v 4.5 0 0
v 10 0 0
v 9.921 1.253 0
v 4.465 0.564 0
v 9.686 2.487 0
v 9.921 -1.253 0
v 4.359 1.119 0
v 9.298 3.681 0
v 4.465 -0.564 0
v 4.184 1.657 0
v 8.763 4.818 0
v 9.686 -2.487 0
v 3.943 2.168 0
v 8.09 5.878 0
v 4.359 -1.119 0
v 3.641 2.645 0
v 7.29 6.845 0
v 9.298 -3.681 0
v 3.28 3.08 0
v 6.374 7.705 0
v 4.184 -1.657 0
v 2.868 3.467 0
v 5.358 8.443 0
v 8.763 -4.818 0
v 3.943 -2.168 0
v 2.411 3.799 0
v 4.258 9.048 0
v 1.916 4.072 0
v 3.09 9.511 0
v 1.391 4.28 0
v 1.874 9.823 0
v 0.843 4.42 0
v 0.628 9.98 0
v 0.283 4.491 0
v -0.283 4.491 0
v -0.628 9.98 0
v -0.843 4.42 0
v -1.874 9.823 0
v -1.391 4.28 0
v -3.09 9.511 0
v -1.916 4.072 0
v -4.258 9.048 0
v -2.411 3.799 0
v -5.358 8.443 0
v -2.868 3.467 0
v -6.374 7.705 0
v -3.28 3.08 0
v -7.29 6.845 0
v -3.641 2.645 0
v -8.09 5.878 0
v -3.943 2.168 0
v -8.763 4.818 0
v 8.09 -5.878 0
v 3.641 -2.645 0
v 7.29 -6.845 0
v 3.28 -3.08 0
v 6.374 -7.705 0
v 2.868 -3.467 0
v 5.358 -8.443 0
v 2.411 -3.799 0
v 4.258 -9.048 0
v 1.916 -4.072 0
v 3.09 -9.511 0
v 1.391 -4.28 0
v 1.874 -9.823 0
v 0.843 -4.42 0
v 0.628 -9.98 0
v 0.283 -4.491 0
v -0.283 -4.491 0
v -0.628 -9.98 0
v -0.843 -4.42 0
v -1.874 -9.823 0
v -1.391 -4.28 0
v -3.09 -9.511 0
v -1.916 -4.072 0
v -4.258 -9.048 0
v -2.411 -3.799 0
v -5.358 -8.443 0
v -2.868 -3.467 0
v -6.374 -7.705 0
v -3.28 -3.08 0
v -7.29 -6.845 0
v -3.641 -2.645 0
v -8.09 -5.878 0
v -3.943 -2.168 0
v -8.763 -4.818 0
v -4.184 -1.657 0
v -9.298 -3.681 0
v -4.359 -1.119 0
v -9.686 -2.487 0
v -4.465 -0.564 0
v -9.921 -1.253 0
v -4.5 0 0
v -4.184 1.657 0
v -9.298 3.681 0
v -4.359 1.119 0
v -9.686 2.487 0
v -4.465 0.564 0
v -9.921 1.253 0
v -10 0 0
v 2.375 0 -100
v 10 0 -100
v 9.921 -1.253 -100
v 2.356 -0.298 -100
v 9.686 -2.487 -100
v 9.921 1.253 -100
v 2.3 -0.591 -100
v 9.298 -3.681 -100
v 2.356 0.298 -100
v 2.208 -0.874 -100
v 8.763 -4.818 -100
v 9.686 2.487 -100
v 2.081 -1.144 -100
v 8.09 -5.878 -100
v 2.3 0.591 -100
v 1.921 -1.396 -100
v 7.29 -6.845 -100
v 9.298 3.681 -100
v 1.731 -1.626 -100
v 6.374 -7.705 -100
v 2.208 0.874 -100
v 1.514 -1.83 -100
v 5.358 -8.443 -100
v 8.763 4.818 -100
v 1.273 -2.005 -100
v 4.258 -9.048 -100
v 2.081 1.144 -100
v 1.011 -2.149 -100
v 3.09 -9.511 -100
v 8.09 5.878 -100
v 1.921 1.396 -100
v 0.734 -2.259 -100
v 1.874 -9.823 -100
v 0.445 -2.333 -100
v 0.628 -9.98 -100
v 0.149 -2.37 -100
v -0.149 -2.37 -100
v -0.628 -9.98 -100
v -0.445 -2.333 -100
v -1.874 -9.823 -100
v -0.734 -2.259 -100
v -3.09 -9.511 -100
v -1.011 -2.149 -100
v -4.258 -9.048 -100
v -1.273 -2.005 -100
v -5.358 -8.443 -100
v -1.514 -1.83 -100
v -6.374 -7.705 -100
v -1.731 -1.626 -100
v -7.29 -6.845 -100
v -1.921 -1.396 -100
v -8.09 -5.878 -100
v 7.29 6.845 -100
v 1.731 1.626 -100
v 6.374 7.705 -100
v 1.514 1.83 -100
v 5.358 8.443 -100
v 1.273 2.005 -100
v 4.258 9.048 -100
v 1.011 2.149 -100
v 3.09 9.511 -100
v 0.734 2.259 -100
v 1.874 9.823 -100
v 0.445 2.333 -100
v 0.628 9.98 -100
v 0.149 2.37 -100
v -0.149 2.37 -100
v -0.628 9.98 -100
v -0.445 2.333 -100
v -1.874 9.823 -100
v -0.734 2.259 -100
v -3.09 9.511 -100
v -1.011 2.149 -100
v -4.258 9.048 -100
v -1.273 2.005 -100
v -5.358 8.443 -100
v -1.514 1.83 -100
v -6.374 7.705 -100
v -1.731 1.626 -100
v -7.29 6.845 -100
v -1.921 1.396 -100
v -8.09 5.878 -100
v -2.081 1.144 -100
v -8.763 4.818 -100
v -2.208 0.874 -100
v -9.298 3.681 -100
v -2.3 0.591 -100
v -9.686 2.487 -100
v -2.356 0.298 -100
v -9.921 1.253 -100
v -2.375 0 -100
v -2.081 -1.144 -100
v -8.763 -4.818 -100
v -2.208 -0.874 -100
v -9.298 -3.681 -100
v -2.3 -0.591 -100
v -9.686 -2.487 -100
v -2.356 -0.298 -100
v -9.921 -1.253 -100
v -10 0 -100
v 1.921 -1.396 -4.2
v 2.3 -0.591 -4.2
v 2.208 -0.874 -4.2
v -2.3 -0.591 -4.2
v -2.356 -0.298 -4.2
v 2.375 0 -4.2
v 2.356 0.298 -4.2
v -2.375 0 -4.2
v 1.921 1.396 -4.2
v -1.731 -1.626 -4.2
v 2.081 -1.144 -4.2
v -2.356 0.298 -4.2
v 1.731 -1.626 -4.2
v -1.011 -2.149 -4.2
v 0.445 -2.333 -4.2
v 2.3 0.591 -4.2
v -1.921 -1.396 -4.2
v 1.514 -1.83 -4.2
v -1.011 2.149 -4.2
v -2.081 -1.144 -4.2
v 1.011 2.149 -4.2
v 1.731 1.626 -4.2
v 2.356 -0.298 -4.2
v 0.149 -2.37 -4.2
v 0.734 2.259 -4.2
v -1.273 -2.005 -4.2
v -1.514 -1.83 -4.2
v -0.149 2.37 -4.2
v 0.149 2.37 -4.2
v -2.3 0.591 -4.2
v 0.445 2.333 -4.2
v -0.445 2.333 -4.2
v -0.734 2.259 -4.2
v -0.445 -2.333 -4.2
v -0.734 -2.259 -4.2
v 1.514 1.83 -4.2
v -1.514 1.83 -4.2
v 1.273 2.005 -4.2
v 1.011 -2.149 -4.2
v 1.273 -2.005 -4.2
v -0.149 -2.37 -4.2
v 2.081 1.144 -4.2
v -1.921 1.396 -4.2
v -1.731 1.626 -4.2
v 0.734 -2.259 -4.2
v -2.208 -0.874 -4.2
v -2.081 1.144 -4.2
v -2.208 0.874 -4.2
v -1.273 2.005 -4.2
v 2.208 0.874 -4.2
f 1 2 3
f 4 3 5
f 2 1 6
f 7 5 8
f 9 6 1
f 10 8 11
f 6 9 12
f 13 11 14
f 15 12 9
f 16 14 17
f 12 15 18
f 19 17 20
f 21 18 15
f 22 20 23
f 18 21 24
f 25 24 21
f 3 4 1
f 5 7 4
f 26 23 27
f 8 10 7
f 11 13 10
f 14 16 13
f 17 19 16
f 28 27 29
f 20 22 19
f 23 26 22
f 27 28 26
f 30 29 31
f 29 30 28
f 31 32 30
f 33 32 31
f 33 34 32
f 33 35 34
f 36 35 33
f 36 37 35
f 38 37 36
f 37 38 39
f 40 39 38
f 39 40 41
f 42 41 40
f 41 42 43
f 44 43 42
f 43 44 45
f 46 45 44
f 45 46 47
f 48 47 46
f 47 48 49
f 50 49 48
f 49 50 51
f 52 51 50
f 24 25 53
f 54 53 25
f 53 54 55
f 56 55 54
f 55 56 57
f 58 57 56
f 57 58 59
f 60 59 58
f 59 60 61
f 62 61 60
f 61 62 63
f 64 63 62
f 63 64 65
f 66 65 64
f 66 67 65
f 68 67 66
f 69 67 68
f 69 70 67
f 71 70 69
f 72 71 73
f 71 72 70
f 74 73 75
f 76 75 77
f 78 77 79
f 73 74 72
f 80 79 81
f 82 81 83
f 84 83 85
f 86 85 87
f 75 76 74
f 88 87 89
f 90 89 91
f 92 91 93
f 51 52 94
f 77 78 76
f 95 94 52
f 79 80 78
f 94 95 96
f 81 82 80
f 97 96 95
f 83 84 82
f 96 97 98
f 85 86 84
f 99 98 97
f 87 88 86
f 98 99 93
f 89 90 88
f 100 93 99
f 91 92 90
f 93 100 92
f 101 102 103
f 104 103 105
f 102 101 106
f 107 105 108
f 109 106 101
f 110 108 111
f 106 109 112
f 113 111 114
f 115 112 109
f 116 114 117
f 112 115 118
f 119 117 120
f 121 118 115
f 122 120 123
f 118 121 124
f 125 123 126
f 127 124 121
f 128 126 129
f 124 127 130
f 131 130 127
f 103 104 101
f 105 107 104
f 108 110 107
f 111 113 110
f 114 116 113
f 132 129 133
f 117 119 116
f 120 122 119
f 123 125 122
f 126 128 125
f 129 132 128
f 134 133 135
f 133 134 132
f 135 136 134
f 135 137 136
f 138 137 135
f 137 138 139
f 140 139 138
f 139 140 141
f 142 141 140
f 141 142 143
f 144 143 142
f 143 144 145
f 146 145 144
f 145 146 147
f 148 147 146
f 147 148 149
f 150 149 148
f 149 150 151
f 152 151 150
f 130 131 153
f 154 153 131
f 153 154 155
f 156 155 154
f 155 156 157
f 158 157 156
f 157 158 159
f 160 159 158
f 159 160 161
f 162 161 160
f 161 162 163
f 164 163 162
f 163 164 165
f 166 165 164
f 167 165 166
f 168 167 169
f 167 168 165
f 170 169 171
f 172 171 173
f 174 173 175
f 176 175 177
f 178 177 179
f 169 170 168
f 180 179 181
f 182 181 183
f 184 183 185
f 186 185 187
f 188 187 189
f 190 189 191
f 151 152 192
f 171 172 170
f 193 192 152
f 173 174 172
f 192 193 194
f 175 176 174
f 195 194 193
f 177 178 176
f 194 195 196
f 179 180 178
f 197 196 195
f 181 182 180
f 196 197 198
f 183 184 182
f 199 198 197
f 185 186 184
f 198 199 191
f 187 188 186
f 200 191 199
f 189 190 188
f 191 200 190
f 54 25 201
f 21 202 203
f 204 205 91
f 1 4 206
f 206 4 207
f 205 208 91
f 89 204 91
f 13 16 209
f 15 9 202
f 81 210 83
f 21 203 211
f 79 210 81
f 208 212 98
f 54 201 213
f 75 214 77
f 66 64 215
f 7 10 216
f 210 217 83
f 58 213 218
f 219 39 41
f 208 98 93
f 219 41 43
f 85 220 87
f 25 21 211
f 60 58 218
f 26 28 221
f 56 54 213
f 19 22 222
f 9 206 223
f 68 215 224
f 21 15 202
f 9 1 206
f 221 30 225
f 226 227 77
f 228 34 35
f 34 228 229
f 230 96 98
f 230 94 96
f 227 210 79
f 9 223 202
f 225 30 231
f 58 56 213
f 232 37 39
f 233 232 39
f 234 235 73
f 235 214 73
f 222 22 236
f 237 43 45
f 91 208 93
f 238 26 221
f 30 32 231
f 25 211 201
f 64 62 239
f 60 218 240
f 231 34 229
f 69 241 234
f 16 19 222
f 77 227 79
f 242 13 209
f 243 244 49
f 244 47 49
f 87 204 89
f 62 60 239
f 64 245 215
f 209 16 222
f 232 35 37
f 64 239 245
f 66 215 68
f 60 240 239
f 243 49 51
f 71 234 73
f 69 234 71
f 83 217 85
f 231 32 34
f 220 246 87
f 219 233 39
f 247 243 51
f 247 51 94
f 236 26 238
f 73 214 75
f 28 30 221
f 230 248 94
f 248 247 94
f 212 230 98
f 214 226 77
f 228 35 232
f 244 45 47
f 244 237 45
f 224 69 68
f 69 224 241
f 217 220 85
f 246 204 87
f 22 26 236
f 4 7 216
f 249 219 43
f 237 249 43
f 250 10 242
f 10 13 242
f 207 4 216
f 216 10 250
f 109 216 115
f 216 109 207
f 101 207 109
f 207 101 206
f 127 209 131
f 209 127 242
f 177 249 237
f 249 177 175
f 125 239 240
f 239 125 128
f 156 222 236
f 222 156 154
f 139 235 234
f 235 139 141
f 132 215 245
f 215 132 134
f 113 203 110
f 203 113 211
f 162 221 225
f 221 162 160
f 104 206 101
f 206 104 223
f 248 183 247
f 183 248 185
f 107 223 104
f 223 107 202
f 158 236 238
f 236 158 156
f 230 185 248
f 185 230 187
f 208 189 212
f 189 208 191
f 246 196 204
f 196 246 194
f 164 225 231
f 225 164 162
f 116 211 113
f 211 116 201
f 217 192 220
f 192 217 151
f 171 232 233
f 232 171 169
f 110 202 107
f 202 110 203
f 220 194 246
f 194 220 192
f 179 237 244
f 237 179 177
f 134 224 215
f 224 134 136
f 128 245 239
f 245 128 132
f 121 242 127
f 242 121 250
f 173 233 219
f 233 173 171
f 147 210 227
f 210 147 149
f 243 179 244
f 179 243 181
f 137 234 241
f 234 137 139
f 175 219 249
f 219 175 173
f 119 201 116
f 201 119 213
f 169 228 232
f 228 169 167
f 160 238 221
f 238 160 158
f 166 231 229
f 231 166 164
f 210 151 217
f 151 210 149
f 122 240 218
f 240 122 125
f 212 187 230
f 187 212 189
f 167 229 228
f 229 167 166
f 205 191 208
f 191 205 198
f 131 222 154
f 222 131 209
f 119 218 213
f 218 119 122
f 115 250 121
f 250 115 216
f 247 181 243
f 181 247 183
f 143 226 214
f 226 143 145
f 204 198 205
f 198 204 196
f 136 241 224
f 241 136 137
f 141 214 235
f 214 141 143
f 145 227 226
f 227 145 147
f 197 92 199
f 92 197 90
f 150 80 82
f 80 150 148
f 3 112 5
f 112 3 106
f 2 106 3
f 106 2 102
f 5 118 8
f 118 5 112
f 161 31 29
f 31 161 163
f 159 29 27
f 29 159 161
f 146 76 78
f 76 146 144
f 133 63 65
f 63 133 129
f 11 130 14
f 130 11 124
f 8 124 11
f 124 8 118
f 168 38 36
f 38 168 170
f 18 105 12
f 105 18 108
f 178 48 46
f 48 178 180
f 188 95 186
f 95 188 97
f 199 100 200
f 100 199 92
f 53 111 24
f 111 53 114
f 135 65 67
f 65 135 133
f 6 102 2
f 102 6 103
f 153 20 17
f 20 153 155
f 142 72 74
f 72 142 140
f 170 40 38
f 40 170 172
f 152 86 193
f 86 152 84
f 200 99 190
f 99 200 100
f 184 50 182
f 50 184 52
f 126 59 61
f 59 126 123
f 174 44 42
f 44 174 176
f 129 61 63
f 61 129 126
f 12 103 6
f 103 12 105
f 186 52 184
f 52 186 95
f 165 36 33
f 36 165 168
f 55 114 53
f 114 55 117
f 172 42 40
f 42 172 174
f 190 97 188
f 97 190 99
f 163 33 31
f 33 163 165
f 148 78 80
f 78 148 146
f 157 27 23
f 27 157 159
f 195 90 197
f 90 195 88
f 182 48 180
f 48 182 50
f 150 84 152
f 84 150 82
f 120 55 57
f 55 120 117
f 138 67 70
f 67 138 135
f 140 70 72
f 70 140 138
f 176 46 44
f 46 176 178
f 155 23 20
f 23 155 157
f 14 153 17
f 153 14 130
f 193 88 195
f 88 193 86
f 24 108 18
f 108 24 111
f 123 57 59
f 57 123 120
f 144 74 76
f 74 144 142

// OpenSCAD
$fn = 50;


difference() {
	union() {
		translate(v = [0, 0, -100.0000000000]) {
			cylinder(h = 100, r = 10.0000000000);
		}
		cylinder(h = 0, r = 20.0000000000);
	}
	union() {
		translate(v = [0, 0, 0]) {
			rotate(a = [0, 0, 0]) {
				difference() {
					union() {
						#translate(v = [0, 0, -100.0000000000]) {
							cylinder(h = 100, r = 2.2500000000);
						}
						#translate(v = [0, 0, -4.2000000000]) {
							cylinder(h = 4.2000000000, r = 10.0000000000, r1 = 2.3750000000, r2 = 4.5000000000);
						}
						#translate(v = [0, 0, -100.0000000000]) {
							cylinder(h = 100, r = 2.3750000000);
						}
						#translate(v = [0, 0, -100.0000000000]) {
							cylinder(h = 100, r = 2.2500000000);
						}
					}
					union();
				}
			}
		}
	}
}
